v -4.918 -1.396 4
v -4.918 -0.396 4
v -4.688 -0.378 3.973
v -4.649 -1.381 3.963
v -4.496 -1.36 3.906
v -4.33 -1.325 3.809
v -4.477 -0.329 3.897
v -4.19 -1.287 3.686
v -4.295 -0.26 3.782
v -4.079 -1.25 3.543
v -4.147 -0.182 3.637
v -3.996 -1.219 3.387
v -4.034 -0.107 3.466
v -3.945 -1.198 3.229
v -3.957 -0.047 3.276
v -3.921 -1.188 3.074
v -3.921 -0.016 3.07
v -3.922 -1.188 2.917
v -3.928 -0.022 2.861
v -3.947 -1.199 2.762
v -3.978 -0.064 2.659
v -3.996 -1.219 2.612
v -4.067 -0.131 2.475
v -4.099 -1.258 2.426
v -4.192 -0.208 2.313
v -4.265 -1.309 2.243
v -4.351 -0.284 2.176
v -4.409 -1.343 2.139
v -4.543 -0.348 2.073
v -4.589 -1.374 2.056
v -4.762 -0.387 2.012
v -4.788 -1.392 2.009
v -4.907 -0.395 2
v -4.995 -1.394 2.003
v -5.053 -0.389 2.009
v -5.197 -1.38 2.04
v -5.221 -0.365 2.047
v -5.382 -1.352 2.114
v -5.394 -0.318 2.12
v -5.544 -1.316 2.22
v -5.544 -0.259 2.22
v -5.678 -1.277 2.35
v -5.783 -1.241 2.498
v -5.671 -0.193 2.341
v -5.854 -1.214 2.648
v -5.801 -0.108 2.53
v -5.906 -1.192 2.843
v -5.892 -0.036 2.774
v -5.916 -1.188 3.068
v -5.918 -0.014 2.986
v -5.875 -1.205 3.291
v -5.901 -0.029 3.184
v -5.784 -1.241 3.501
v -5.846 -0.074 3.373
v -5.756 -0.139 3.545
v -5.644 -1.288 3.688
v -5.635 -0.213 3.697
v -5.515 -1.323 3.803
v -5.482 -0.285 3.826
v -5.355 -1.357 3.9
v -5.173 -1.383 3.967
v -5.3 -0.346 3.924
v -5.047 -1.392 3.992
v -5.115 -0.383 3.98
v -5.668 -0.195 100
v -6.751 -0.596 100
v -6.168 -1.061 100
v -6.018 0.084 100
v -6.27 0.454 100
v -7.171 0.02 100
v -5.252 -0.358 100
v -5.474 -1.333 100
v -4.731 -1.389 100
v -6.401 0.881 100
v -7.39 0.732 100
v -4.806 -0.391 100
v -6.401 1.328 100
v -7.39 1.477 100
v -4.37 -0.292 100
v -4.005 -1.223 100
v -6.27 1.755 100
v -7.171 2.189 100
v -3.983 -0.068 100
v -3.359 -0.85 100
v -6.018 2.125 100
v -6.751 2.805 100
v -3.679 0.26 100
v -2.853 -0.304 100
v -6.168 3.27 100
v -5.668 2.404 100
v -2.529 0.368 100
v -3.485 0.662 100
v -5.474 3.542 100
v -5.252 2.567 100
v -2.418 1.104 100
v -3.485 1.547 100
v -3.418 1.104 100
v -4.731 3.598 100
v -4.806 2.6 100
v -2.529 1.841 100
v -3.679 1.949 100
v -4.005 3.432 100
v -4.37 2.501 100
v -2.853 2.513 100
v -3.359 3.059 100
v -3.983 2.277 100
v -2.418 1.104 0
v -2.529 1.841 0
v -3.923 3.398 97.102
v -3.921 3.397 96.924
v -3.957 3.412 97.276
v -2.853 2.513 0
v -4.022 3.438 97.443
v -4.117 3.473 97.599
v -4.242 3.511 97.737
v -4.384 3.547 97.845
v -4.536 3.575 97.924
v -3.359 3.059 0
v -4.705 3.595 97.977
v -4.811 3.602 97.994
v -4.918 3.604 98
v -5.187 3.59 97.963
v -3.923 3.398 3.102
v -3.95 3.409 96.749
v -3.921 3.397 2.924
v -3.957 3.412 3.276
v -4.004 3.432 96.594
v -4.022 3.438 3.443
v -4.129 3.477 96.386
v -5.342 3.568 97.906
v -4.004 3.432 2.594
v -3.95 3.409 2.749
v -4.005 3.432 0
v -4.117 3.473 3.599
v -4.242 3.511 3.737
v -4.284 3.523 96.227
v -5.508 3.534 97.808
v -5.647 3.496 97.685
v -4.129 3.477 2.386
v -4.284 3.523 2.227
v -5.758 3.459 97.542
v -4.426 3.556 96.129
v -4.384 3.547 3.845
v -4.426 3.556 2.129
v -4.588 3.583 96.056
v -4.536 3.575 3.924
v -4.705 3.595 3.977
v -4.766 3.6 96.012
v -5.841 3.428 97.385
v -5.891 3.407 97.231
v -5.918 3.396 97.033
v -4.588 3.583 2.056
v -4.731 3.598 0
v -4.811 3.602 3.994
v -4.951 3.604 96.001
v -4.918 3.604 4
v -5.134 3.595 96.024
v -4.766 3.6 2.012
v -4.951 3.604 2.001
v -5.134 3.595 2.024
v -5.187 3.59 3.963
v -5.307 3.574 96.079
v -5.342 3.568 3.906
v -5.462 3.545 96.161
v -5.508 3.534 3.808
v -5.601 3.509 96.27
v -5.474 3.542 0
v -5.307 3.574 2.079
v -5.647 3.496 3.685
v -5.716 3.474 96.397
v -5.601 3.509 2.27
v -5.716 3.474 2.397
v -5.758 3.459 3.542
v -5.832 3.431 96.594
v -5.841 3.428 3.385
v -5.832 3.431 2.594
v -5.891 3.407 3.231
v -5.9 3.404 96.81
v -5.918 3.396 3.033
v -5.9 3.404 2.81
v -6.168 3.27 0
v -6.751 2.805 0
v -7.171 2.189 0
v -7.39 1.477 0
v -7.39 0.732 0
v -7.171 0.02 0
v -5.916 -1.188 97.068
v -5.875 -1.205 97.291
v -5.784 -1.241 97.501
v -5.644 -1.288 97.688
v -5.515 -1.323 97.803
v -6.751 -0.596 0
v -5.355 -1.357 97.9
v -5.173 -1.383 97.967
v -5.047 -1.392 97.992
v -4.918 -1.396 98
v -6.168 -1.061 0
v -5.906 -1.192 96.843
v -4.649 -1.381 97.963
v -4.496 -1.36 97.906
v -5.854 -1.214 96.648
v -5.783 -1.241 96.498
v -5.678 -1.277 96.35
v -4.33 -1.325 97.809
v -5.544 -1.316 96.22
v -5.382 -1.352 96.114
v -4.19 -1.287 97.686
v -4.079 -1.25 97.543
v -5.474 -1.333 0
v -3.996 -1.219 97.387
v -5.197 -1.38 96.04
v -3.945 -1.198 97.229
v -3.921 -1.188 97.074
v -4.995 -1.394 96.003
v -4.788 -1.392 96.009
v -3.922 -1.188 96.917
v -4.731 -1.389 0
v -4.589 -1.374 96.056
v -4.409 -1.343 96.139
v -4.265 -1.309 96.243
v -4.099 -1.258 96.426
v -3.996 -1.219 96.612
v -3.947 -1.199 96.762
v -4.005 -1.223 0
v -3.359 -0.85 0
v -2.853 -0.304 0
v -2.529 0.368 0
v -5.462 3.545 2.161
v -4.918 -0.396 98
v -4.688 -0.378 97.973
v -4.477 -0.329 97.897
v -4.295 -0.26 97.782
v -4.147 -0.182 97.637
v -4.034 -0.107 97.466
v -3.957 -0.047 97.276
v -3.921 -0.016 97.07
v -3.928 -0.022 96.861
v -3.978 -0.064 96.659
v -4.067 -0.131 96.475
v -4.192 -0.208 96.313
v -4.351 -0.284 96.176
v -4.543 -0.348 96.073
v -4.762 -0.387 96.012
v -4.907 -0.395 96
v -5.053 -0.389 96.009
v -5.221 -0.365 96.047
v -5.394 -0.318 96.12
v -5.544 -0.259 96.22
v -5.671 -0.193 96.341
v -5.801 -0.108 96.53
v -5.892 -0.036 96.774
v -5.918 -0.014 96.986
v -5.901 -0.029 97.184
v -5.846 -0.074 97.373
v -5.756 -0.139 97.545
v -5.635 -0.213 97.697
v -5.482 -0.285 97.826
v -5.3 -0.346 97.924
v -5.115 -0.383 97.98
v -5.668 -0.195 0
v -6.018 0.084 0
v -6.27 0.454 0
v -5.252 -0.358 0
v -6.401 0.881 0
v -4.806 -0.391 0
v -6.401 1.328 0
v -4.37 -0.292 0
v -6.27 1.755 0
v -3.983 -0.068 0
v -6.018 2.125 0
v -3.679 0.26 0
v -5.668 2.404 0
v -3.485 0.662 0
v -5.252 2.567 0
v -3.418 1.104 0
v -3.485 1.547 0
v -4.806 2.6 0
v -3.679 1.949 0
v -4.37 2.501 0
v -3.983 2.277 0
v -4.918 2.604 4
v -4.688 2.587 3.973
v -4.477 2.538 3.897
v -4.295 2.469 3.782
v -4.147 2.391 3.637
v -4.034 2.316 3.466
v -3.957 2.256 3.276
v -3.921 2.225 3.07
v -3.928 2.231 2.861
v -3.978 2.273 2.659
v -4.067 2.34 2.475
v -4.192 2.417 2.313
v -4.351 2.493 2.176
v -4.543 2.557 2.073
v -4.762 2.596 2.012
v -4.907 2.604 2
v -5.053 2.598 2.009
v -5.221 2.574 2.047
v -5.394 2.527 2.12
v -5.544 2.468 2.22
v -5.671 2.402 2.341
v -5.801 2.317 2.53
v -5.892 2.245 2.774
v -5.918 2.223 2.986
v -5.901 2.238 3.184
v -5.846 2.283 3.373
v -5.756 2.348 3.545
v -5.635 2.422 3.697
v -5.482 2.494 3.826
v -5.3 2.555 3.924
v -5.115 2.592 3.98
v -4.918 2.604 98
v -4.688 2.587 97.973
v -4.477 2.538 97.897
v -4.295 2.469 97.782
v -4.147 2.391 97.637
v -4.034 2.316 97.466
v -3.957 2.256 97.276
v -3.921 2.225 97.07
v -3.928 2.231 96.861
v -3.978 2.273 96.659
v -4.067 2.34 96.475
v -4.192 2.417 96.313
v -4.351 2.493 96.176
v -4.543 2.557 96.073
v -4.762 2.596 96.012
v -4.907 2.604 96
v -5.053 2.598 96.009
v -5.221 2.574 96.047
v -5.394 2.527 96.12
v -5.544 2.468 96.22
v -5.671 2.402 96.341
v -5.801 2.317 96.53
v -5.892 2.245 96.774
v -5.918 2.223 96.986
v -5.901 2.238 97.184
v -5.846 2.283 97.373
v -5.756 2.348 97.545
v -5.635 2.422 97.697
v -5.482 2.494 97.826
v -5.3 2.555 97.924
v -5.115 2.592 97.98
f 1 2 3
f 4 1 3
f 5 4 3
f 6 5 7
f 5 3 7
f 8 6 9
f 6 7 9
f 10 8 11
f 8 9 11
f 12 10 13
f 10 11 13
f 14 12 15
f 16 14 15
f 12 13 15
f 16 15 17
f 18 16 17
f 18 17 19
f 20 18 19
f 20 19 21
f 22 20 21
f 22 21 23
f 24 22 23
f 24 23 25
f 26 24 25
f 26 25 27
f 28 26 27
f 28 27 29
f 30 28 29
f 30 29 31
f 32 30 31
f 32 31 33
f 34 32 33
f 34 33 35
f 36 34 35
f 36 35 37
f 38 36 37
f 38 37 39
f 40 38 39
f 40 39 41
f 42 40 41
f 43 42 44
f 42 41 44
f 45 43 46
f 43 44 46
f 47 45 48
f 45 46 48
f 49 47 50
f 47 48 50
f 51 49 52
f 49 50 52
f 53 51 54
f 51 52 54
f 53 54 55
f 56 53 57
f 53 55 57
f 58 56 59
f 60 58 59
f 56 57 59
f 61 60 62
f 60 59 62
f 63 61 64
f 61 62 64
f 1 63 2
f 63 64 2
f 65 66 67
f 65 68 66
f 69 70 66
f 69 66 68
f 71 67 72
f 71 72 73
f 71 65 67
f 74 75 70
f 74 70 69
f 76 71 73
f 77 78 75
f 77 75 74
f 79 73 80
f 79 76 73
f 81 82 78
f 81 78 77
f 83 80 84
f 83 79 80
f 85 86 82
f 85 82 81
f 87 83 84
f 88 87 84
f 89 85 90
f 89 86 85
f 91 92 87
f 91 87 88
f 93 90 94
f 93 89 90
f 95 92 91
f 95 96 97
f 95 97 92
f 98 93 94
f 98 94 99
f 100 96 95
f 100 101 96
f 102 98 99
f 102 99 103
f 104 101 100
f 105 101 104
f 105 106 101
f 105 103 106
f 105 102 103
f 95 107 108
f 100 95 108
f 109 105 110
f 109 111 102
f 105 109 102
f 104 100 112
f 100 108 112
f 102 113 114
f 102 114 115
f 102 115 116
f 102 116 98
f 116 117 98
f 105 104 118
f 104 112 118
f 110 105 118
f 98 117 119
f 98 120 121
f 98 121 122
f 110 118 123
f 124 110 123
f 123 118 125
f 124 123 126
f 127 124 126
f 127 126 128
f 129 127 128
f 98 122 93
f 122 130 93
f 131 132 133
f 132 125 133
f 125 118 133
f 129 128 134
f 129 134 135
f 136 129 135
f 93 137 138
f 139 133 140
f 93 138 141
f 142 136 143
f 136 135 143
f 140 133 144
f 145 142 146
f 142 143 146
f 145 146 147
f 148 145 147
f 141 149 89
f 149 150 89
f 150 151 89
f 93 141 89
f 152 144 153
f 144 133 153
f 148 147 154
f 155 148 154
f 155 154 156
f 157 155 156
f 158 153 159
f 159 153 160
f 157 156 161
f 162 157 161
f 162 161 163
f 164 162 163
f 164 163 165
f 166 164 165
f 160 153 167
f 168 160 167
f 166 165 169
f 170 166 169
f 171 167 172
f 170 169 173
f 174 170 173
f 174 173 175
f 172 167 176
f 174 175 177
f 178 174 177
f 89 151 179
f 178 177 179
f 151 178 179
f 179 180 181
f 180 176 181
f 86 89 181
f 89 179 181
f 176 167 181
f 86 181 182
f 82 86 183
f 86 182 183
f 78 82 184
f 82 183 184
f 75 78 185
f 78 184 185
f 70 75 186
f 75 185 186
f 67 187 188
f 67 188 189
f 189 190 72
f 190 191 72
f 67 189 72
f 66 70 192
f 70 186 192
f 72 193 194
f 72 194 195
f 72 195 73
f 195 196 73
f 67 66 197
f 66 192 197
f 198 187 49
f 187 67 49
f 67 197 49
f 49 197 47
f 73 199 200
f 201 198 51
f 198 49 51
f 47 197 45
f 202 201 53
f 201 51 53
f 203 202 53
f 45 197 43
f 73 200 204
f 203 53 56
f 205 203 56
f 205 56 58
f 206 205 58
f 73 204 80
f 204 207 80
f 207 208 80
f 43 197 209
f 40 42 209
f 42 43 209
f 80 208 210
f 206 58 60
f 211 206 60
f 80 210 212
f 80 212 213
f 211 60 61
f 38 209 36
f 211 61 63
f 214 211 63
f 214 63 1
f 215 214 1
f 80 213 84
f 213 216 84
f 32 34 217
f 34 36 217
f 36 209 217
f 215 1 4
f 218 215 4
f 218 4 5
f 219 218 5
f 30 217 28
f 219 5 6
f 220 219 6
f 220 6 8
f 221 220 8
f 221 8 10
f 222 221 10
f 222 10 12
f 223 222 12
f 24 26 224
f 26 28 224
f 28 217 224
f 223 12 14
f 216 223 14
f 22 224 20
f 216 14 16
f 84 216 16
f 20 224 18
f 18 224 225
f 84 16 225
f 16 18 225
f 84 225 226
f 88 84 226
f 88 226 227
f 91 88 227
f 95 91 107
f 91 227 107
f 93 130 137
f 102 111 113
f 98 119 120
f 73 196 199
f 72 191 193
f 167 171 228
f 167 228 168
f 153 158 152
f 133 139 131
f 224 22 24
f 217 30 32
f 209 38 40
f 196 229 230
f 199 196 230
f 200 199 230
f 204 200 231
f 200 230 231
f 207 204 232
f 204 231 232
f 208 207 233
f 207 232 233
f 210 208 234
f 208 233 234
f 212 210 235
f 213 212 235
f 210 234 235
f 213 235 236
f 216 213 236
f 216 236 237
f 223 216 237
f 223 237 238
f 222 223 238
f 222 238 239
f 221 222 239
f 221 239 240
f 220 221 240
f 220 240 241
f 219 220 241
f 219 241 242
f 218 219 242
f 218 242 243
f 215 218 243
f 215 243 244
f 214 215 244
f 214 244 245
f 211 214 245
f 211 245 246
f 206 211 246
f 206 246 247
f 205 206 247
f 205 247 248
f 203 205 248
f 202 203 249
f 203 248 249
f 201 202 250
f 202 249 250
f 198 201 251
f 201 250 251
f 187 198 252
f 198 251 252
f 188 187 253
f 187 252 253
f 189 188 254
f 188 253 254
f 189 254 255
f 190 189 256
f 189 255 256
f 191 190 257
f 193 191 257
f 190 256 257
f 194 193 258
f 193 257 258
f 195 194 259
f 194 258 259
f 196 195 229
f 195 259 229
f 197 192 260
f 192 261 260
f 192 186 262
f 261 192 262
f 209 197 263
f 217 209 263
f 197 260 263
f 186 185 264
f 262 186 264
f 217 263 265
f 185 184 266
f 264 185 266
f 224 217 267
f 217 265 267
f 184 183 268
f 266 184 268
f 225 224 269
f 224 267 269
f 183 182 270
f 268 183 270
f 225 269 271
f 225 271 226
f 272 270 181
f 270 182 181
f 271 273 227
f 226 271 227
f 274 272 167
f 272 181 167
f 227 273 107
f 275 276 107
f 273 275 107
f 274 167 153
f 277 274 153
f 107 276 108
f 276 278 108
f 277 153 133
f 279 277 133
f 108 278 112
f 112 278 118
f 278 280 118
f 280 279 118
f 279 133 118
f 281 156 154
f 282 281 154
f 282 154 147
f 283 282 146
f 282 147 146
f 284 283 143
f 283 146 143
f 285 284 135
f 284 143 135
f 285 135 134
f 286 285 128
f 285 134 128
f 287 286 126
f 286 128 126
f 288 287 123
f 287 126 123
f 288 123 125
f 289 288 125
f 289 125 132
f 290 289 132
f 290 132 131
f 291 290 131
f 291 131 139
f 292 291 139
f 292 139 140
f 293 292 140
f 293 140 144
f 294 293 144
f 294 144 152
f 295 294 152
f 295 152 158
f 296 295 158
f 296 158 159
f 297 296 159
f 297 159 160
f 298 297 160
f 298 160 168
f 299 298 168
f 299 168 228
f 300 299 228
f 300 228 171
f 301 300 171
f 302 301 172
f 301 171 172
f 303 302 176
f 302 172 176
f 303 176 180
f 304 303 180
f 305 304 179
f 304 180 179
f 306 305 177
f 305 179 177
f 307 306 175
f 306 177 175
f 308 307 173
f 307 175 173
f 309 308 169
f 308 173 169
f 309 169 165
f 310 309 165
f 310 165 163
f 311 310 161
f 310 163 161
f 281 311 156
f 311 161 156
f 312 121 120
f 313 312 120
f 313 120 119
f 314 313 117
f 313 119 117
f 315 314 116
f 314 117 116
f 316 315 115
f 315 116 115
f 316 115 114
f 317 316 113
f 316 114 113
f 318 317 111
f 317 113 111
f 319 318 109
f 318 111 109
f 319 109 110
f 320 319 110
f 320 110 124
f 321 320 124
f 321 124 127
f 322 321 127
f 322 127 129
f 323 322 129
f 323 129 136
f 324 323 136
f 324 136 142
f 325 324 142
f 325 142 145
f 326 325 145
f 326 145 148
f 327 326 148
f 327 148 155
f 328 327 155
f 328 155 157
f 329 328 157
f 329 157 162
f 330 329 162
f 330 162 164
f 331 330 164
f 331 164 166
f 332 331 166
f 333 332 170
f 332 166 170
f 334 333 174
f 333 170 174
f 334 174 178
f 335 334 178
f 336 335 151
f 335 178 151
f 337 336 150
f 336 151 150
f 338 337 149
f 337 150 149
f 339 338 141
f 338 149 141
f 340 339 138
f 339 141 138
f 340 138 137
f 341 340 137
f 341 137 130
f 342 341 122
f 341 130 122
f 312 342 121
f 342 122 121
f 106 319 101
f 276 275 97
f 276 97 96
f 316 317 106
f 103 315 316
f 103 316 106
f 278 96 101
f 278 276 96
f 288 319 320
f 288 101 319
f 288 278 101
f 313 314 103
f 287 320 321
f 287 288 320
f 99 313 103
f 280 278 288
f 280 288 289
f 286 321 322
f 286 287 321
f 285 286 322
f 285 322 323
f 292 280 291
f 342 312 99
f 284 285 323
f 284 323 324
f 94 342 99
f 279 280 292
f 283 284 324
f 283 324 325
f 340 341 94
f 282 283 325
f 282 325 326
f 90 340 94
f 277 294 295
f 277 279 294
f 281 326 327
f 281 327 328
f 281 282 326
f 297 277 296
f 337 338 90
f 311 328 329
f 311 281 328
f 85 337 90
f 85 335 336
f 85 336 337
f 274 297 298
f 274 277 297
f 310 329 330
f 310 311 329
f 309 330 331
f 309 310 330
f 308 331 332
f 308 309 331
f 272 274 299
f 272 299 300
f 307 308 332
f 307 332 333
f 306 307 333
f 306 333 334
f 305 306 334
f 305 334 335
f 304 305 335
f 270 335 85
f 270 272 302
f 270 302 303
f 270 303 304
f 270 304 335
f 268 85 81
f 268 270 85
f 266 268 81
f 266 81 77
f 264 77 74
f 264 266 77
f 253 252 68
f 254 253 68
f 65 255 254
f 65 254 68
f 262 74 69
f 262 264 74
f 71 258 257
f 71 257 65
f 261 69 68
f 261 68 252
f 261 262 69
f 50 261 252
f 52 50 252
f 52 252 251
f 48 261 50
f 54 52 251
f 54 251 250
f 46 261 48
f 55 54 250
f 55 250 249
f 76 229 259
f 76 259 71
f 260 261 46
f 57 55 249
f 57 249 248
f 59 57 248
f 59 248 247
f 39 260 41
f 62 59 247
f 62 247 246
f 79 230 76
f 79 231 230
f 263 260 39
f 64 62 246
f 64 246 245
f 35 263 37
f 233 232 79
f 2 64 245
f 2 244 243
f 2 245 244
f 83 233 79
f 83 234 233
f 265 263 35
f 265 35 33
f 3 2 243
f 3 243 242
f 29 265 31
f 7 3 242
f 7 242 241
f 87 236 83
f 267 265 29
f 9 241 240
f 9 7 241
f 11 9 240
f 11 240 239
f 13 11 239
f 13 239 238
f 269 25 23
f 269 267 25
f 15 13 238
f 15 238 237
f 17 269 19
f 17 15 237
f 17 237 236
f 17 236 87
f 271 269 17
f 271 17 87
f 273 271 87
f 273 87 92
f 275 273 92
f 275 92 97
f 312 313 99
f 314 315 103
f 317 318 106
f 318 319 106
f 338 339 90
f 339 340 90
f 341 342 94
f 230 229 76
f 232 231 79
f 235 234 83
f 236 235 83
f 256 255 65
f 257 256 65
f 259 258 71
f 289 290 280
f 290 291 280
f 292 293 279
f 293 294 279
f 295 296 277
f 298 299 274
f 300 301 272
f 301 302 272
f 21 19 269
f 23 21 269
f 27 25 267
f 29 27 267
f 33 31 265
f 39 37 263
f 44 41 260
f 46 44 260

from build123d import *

# Parameters (mm, degrees)
ESQUISSE1_R             = 2.5
ESQUISSE1_R_2           = 1.5
BOSS_EXTRU_1_DEPTH      = 100
ESQUISSE2_R             = 1
ENL_V_MAT_EXTRU_1_DEPTH = 101.399348663


with BuildPart() as part:
    # Esquisse1 → Boss.-Extru.1 (new body)
    with BuildSketch(Plane.XY):
        with Locations((-4.918167702, 1.104491281)):
            Circle(ESQUISSE1_R)
        with Locations((-4.918167702, 1.104491281)):
            Circle(ESQUISSE1_R_2, mode=Mode.SUBTRACT)
    extrude(amount=BOSS_EXTRU_1_DEPTH)

    # Esquisse2 → Enlèv. mat.-Extru.1 (cut, through all)
    with BuildSketch(Plane(origin=(0, 3.604491281, 0), x_dir=(1, 0, 0), z_dir=(0, 1, 0))):
        with Locations(Location((-4.918167702, -3, 0), (0, 0, 270))):
            Circle(ESQUISSE2_R)
        with Locations(Location((-4.918167702, -97, 0), (0, 0, 270))):
            Circle(ESQUISSE2_R)
    extrude(amount=-ENL_V_MAT_EXTRU_1_DEPTH, mode=Mode.SUBTRACT)


solid = part.part
